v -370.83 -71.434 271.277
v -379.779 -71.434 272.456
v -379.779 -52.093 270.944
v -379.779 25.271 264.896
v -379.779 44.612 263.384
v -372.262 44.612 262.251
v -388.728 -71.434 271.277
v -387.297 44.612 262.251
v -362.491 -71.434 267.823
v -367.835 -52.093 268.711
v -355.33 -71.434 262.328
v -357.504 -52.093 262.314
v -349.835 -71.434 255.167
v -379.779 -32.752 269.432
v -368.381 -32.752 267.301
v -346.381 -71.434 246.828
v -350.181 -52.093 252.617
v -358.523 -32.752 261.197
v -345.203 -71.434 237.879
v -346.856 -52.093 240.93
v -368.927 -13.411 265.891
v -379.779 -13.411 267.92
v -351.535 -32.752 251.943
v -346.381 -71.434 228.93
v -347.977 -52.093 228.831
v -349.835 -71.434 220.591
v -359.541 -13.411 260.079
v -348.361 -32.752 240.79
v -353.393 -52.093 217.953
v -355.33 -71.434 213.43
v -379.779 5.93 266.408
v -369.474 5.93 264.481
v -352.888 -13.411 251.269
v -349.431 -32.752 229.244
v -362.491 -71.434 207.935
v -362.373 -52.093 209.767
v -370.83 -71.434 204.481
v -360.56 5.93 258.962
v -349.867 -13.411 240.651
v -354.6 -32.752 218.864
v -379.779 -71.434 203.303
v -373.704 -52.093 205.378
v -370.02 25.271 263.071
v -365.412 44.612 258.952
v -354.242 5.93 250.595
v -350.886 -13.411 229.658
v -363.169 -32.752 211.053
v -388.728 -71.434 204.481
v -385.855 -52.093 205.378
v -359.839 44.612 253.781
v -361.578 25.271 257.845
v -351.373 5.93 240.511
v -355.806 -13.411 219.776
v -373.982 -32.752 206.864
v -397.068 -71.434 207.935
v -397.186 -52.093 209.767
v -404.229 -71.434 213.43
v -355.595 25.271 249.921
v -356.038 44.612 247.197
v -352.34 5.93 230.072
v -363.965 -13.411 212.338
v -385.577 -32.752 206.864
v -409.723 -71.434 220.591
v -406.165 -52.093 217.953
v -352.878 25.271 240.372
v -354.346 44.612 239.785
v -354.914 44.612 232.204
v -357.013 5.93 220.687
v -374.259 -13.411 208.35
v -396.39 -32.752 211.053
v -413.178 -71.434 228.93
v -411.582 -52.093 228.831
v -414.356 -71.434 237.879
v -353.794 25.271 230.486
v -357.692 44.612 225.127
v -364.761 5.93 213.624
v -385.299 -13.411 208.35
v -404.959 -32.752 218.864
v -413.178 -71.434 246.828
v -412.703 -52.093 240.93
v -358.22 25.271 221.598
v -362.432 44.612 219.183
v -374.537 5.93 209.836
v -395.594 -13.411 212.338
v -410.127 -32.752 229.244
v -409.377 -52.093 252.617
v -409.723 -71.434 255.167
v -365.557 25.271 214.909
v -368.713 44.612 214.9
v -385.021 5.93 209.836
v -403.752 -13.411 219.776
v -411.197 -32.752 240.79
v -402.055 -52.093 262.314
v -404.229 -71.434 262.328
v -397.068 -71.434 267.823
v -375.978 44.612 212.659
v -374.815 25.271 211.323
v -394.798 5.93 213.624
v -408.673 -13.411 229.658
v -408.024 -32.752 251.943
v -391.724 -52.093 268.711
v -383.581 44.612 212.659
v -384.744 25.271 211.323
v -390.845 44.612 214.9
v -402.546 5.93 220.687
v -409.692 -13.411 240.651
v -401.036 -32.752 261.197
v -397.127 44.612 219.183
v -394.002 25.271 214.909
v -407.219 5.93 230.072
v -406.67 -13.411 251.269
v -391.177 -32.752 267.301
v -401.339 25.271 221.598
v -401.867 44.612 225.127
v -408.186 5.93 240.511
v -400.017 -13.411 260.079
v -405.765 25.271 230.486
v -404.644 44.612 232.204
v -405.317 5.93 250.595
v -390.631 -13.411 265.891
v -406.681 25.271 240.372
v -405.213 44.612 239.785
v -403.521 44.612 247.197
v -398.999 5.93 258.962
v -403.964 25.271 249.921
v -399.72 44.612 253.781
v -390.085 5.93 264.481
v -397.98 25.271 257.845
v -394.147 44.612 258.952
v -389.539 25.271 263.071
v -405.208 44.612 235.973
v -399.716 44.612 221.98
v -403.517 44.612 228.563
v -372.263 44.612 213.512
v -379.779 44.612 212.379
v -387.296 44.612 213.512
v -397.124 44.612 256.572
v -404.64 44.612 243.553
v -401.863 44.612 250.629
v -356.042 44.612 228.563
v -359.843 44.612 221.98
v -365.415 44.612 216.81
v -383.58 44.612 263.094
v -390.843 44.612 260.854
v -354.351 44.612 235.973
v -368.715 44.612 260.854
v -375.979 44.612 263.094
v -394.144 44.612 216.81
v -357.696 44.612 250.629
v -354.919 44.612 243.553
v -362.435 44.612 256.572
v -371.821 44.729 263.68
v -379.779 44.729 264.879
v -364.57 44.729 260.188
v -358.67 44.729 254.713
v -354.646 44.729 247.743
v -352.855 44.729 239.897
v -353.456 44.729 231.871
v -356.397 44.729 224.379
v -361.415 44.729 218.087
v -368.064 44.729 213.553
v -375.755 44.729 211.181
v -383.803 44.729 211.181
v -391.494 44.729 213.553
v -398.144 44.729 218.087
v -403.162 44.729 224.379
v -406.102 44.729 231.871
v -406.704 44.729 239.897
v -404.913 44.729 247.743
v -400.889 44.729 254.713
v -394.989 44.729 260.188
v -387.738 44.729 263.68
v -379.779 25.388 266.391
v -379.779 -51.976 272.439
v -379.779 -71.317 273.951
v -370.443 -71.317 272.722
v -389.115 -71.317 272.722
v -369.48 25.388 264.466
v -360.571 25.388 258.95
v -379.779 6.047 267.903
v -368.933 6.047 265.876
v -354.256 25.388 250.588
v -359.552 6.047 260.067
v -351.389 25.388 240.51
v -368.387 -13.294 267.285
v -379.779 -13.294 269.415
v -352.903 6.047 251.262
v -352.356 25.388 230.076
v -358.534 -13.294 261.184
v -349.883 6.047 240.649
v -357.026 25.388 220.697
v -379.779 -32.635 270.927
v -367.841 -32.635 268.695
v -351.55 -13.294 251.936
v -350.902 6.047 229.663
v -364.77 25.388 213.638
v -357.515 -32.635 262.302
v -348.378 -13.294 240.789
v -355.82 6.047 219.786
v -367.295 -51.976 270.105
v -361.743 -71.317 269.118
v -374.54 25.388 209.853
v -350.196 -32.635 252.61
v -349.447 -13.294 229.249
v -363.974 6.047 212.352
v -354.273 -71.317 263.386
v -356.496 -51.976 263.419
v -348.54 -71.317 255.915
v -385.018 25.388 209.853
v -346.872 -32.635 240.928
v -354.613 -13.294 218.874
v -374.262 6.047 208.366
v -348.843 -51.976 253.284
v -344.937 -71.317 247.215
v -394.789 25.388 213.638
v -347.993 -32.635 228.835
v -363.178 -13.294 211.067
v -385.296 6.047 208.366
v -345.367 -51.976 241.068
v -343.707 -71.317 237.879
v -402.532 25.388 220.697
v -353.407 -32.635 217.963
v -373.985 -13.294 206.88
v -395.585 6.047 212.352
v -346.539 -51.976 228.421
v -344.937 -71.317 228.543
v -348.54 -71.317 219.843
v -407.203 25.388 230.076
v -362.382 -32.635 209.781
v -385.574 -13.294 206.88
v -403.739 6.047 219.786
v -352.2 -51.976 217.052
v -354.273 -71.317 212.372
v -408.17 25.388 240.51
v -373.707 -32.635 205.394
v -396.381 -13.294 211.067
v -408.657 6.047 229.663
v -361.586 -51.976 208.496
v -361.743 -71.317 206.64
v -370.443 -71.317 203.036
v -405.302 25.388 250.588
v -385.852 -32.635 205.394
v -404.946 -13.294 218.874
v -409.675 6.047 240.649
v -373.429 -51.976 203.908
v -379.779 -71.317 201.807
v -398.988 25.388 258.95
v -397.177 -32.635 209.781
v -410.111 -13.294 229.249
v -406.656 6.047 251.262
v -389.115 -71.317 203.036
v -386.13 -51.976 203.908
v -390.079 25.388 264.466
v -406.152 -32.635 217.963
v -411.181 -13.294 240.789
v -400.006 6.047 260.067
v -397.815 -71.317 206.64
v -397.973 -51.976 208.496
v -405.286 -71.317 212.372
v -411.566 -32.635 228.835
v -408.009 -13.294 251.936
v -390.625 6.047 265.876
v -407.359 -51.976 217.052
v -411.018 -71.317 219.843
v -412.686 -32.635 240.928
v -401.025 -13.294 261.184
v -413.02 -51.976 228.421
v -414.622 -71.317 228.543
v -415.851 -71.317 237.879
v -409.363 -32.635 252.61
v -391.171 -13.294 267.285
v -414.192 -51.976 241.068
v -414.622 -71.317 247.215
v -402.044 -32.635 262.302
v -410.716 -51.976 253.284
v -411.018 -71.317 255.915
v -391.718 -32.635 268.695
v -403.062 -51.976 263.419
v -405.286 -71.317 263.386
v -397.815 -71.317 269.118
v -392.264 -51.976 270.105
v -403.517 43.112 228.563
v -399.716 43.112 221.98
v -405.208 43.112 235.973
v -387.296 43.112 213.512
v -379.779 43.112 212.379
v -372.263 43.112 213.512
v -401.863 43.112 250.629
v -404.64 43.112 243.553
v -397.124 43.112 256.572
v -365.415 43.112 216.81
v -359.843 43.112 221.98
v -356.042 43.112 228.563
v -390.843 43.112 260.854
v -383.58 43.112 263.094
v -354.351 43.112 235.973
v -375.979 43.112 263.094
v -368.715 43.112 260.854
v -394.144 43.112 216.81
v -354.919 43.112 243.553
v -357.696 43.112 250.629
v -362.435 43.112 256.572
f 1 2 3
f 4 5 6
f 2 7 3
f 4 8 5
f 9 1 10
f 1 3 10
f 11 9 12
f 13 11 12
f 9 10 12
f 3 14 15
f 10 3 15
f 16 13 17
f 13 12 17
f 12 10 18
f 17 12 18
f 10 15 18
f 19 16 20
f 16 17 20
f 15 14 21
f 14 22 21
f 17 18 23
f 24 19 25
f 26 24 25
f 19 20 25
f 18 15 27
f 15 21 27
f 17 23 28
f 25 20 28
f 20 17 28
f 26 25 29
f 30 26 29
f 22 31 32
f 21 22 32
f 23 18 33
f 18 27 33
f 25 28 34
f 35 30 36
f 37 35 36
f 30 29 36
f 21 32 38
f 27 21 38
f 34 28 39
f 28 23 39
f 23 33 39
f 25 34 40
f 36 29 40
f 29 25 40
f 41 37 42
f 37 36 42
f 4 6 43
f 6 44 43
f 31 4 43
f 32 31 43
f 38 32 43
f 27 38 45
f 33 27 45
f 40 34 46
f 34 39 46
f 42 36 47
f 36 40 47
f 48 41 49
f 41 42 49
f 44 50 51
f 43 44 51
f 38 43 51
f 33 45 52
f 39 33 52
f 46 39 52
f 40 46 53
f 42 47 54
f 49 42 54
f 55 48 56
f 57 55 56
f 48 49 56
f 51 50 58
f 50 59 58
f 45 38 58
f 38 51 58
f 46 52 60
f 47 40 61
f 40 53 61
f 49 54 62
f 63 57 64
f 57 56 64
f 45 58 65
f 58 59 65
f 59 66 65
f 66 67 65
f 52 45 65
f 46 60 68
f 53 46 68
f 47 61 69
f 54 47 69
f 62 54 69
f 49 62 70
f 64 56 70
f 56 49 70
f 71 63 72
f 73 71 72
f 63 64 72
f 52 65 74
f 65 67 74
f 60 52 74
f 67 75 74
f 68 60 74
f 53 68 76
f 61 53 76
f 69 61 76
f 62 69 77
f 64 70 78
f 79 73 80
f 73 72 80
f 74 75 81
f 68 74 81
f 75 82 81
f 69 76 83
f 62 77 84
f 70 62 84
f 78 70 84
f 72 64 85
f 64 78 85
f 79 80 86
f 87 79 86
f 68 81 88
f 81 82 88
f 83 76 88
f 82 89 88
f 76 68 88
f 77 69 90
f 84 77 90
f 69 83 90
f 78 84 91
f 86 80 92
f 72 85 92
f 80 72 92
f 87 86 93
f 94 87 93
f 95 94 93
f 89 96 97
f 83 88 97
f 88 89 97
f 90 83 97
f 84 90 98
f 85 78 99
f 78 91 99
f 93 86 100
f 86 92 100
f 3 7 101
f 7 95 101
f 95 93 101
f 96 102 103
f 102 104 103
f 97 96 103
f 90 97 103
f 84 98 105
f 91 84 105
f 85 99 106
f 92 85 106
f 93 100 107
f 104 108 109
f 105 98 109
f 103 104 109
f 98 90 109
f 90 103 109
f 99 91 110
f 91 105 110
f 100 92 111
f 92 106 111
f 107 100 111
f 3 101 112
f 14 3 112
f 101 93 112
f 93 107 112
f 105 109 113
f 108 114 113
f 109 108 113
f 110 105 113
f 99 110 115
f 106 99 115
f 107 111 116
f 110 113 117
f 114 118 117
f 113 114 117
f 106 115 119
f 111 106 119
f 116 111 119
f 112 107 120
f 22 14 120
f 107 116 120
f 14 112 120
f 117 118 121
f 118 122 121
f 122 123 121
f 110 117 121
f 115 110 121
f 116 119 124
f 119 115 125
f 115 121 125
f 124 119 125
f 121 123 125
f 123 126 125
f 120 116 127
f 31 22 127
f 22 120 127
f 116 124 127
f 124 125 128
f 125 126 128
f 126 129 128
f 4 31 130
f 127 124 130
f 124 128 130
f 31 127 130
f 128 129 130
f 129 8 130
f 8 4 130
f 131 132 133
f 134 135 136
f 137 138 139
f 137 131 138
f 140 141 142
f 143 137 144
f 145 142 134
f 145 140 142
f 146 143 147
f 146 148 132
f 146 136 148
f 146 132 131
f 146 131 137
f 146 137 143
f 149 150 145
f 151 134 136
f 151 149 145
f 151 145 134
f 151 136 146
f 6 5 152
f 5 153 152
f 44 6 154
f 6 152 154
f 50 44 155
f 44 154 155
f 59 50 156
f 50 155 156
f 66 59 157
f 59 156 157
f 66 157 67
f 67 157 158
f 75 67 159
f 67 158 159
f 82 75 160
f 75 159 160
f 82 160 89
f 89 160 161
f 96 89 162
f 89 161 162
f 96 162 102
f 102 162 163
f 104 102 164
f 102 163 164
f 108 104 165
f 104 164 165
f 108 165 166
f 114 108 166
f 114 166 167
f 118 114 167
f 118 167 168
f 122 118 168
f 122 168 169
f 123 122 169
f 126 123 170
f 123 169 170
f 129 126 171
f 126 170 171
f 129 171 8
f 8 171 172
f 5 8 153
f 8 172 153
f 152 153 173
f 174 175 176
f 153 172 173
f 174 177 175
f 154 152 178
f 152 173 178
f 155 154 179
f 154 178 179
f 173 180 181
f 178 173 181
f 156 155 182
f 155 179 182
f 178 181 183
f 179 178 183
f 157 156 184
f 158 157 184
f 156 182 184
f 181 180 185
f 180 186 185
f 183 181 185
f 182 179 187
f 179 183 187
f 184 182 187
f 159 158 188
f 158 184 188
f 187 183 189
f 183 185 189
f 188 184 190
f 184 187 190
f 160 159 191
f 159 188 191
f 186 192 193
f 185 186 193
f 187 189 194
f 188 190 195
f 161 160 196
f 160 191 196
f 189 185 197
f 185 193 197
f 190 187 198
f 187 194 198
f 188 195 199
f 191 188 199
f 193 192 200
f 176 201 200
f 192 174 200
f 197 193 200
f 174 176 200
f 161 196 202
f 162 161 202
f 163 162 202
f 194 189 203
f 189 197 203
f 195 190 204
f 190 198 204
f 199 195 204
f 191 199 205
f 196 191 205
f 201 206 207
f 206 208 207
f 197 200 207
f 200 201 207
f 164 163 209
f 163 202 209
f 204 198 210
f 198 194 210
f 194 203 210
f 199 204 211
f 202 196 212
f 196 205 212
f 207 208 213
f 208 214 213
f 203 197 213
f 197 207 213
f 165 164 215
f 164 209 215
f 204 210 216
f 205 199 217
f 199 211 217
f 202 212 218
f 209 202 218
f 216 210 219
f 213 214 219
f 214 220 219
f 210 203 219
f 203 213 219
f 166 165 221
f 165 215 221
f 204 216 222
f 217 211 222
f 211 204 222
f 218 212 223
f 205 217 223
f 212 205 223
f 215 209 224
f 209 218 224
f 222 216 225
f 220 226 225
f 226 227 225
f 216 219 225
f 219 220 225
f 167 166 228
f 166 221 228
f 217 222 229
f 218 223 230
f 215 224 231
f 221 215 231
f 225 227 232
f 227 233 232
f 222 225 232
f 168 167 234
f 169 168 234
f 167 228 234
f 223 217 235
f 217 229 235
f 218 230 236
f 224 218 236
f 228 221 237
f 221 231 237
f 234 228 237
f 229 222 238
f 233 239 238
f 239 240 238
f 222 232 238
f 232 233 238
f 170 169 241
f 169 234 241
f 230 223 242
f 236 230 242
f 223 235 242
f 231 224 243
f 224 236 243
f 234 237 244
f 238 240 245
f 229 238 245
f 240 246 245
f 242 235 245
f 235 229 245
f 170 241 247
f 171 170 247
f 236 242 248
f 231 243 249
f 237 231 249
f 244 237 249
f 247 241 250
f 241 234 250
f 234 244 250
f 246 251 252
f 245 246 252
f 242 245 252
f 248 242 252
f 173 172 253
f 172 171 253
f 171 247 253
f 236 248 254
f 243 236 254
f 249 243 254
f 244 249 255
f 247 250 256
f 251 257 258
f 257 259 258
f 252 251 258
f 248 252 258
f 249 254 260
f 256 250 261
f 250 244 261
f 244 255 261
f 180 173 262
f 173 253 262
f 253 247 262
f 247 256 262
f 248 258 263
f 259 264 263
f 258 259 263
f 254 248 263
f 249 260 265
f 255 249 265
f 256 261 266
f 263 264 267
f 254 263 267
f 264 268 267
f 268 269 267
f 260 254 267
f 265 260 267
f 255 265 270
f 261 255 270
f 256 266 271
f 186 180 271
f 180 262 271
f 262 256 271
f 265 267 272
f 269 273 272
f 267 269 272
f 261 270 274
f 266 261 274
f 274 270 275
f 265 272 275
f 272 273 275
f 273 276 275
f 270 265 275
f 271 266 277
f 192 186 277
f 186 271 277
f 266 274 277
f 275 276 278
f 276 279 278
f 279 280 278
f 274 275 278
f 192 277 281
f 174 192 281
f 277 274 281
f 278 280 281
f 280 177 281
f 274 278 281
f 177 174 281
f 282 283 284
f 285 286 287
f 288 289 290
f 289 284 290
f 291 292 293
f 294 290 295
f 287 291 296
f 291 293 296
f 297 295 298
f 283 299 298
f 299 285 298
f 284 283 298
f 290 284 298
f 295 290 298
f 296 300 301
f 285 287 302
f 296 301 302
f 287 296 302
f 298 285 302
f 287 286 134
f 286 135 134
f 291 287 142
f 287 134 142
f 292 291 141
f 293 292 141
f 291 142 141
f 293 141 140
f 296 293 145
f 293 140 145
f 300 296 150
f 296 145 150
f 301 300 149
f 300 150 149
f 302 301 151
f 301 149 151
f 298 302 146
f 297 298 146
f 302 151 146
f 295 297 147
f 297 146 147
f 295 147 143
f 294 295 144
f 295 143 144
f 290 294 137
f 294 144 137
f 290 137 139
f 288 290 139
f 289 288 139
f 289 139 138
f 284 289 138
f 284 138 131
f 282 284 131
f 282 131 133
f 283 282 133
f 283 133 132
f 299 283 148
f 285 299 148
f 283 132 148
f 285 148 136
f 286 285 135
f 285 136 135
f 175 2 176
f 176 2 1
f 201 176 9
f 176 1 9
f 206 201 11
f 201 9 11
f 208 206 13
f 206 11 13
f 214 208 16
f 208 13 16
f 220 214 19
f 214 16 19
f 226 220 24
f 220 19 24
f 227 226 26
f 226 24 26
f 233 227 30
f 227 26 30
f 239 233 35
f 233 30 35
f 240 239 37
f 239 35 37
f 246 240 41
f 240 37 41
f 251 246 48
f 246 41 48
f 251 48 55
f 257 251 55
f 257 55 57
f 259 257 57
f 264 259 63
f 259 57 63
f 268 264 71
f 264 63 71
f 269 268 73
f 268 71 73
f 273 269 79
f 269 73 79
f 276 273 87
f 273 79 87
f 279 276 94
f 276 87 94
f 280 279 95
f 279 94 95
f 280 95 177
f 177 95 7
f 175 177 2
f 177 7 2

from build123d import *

# Parameters (mm, degrees)
ESQUISSE5_W = 25.5
ESQUISSE5_H = 1.5


with BuildPart() as part:
    # Esquisse5 → Révolution2 (revolve)
    with BuildSketch(Plane.XY.offset(237.879067036), mode=Mode.PRIVATE) as r_volution2_sk:
        with Locations((-367.02933529, 43.862102616)):
            Rectangle(ESQUISSE5_W, ESQUISSE5_H)
    revolve(r_volution2_sk.sketch.rotate(Axis((-379.77933529, 44.612102616, 237.879067036), (0, -1, 0)), 270), axis=Axis((-379.77933529, 44.612102616, 237.879067036), (0, -1, 0)))


with BuildPart() as body_2:
    # Esquisse10 → Révolution3 (revolve)
    with BuildSketch(Plane(origin=(0, 0, 237.879067036), x_dir=(-1, 0, 0), z_dir=(0, 0, -1)), mode=Mode.PRIVATE) as r_volution3_sk:
        Polygon((343.707456815, -71.316935312), (345.202894233, -71.433840962), (354.274772708, 44.612102616), (352.77933529, 44.729008266), align=None)
    revolve(r_volution3_sk.sketch.rotate(Axis((-379.77933529, -71.433840962, 237.879067036), (0, 1, 0)), 270), axis=Axis((-379.77933529, -71.433840962, 237.879067036), (0, 1, 0)))


solid = Compound([part.part, body_2.part])
